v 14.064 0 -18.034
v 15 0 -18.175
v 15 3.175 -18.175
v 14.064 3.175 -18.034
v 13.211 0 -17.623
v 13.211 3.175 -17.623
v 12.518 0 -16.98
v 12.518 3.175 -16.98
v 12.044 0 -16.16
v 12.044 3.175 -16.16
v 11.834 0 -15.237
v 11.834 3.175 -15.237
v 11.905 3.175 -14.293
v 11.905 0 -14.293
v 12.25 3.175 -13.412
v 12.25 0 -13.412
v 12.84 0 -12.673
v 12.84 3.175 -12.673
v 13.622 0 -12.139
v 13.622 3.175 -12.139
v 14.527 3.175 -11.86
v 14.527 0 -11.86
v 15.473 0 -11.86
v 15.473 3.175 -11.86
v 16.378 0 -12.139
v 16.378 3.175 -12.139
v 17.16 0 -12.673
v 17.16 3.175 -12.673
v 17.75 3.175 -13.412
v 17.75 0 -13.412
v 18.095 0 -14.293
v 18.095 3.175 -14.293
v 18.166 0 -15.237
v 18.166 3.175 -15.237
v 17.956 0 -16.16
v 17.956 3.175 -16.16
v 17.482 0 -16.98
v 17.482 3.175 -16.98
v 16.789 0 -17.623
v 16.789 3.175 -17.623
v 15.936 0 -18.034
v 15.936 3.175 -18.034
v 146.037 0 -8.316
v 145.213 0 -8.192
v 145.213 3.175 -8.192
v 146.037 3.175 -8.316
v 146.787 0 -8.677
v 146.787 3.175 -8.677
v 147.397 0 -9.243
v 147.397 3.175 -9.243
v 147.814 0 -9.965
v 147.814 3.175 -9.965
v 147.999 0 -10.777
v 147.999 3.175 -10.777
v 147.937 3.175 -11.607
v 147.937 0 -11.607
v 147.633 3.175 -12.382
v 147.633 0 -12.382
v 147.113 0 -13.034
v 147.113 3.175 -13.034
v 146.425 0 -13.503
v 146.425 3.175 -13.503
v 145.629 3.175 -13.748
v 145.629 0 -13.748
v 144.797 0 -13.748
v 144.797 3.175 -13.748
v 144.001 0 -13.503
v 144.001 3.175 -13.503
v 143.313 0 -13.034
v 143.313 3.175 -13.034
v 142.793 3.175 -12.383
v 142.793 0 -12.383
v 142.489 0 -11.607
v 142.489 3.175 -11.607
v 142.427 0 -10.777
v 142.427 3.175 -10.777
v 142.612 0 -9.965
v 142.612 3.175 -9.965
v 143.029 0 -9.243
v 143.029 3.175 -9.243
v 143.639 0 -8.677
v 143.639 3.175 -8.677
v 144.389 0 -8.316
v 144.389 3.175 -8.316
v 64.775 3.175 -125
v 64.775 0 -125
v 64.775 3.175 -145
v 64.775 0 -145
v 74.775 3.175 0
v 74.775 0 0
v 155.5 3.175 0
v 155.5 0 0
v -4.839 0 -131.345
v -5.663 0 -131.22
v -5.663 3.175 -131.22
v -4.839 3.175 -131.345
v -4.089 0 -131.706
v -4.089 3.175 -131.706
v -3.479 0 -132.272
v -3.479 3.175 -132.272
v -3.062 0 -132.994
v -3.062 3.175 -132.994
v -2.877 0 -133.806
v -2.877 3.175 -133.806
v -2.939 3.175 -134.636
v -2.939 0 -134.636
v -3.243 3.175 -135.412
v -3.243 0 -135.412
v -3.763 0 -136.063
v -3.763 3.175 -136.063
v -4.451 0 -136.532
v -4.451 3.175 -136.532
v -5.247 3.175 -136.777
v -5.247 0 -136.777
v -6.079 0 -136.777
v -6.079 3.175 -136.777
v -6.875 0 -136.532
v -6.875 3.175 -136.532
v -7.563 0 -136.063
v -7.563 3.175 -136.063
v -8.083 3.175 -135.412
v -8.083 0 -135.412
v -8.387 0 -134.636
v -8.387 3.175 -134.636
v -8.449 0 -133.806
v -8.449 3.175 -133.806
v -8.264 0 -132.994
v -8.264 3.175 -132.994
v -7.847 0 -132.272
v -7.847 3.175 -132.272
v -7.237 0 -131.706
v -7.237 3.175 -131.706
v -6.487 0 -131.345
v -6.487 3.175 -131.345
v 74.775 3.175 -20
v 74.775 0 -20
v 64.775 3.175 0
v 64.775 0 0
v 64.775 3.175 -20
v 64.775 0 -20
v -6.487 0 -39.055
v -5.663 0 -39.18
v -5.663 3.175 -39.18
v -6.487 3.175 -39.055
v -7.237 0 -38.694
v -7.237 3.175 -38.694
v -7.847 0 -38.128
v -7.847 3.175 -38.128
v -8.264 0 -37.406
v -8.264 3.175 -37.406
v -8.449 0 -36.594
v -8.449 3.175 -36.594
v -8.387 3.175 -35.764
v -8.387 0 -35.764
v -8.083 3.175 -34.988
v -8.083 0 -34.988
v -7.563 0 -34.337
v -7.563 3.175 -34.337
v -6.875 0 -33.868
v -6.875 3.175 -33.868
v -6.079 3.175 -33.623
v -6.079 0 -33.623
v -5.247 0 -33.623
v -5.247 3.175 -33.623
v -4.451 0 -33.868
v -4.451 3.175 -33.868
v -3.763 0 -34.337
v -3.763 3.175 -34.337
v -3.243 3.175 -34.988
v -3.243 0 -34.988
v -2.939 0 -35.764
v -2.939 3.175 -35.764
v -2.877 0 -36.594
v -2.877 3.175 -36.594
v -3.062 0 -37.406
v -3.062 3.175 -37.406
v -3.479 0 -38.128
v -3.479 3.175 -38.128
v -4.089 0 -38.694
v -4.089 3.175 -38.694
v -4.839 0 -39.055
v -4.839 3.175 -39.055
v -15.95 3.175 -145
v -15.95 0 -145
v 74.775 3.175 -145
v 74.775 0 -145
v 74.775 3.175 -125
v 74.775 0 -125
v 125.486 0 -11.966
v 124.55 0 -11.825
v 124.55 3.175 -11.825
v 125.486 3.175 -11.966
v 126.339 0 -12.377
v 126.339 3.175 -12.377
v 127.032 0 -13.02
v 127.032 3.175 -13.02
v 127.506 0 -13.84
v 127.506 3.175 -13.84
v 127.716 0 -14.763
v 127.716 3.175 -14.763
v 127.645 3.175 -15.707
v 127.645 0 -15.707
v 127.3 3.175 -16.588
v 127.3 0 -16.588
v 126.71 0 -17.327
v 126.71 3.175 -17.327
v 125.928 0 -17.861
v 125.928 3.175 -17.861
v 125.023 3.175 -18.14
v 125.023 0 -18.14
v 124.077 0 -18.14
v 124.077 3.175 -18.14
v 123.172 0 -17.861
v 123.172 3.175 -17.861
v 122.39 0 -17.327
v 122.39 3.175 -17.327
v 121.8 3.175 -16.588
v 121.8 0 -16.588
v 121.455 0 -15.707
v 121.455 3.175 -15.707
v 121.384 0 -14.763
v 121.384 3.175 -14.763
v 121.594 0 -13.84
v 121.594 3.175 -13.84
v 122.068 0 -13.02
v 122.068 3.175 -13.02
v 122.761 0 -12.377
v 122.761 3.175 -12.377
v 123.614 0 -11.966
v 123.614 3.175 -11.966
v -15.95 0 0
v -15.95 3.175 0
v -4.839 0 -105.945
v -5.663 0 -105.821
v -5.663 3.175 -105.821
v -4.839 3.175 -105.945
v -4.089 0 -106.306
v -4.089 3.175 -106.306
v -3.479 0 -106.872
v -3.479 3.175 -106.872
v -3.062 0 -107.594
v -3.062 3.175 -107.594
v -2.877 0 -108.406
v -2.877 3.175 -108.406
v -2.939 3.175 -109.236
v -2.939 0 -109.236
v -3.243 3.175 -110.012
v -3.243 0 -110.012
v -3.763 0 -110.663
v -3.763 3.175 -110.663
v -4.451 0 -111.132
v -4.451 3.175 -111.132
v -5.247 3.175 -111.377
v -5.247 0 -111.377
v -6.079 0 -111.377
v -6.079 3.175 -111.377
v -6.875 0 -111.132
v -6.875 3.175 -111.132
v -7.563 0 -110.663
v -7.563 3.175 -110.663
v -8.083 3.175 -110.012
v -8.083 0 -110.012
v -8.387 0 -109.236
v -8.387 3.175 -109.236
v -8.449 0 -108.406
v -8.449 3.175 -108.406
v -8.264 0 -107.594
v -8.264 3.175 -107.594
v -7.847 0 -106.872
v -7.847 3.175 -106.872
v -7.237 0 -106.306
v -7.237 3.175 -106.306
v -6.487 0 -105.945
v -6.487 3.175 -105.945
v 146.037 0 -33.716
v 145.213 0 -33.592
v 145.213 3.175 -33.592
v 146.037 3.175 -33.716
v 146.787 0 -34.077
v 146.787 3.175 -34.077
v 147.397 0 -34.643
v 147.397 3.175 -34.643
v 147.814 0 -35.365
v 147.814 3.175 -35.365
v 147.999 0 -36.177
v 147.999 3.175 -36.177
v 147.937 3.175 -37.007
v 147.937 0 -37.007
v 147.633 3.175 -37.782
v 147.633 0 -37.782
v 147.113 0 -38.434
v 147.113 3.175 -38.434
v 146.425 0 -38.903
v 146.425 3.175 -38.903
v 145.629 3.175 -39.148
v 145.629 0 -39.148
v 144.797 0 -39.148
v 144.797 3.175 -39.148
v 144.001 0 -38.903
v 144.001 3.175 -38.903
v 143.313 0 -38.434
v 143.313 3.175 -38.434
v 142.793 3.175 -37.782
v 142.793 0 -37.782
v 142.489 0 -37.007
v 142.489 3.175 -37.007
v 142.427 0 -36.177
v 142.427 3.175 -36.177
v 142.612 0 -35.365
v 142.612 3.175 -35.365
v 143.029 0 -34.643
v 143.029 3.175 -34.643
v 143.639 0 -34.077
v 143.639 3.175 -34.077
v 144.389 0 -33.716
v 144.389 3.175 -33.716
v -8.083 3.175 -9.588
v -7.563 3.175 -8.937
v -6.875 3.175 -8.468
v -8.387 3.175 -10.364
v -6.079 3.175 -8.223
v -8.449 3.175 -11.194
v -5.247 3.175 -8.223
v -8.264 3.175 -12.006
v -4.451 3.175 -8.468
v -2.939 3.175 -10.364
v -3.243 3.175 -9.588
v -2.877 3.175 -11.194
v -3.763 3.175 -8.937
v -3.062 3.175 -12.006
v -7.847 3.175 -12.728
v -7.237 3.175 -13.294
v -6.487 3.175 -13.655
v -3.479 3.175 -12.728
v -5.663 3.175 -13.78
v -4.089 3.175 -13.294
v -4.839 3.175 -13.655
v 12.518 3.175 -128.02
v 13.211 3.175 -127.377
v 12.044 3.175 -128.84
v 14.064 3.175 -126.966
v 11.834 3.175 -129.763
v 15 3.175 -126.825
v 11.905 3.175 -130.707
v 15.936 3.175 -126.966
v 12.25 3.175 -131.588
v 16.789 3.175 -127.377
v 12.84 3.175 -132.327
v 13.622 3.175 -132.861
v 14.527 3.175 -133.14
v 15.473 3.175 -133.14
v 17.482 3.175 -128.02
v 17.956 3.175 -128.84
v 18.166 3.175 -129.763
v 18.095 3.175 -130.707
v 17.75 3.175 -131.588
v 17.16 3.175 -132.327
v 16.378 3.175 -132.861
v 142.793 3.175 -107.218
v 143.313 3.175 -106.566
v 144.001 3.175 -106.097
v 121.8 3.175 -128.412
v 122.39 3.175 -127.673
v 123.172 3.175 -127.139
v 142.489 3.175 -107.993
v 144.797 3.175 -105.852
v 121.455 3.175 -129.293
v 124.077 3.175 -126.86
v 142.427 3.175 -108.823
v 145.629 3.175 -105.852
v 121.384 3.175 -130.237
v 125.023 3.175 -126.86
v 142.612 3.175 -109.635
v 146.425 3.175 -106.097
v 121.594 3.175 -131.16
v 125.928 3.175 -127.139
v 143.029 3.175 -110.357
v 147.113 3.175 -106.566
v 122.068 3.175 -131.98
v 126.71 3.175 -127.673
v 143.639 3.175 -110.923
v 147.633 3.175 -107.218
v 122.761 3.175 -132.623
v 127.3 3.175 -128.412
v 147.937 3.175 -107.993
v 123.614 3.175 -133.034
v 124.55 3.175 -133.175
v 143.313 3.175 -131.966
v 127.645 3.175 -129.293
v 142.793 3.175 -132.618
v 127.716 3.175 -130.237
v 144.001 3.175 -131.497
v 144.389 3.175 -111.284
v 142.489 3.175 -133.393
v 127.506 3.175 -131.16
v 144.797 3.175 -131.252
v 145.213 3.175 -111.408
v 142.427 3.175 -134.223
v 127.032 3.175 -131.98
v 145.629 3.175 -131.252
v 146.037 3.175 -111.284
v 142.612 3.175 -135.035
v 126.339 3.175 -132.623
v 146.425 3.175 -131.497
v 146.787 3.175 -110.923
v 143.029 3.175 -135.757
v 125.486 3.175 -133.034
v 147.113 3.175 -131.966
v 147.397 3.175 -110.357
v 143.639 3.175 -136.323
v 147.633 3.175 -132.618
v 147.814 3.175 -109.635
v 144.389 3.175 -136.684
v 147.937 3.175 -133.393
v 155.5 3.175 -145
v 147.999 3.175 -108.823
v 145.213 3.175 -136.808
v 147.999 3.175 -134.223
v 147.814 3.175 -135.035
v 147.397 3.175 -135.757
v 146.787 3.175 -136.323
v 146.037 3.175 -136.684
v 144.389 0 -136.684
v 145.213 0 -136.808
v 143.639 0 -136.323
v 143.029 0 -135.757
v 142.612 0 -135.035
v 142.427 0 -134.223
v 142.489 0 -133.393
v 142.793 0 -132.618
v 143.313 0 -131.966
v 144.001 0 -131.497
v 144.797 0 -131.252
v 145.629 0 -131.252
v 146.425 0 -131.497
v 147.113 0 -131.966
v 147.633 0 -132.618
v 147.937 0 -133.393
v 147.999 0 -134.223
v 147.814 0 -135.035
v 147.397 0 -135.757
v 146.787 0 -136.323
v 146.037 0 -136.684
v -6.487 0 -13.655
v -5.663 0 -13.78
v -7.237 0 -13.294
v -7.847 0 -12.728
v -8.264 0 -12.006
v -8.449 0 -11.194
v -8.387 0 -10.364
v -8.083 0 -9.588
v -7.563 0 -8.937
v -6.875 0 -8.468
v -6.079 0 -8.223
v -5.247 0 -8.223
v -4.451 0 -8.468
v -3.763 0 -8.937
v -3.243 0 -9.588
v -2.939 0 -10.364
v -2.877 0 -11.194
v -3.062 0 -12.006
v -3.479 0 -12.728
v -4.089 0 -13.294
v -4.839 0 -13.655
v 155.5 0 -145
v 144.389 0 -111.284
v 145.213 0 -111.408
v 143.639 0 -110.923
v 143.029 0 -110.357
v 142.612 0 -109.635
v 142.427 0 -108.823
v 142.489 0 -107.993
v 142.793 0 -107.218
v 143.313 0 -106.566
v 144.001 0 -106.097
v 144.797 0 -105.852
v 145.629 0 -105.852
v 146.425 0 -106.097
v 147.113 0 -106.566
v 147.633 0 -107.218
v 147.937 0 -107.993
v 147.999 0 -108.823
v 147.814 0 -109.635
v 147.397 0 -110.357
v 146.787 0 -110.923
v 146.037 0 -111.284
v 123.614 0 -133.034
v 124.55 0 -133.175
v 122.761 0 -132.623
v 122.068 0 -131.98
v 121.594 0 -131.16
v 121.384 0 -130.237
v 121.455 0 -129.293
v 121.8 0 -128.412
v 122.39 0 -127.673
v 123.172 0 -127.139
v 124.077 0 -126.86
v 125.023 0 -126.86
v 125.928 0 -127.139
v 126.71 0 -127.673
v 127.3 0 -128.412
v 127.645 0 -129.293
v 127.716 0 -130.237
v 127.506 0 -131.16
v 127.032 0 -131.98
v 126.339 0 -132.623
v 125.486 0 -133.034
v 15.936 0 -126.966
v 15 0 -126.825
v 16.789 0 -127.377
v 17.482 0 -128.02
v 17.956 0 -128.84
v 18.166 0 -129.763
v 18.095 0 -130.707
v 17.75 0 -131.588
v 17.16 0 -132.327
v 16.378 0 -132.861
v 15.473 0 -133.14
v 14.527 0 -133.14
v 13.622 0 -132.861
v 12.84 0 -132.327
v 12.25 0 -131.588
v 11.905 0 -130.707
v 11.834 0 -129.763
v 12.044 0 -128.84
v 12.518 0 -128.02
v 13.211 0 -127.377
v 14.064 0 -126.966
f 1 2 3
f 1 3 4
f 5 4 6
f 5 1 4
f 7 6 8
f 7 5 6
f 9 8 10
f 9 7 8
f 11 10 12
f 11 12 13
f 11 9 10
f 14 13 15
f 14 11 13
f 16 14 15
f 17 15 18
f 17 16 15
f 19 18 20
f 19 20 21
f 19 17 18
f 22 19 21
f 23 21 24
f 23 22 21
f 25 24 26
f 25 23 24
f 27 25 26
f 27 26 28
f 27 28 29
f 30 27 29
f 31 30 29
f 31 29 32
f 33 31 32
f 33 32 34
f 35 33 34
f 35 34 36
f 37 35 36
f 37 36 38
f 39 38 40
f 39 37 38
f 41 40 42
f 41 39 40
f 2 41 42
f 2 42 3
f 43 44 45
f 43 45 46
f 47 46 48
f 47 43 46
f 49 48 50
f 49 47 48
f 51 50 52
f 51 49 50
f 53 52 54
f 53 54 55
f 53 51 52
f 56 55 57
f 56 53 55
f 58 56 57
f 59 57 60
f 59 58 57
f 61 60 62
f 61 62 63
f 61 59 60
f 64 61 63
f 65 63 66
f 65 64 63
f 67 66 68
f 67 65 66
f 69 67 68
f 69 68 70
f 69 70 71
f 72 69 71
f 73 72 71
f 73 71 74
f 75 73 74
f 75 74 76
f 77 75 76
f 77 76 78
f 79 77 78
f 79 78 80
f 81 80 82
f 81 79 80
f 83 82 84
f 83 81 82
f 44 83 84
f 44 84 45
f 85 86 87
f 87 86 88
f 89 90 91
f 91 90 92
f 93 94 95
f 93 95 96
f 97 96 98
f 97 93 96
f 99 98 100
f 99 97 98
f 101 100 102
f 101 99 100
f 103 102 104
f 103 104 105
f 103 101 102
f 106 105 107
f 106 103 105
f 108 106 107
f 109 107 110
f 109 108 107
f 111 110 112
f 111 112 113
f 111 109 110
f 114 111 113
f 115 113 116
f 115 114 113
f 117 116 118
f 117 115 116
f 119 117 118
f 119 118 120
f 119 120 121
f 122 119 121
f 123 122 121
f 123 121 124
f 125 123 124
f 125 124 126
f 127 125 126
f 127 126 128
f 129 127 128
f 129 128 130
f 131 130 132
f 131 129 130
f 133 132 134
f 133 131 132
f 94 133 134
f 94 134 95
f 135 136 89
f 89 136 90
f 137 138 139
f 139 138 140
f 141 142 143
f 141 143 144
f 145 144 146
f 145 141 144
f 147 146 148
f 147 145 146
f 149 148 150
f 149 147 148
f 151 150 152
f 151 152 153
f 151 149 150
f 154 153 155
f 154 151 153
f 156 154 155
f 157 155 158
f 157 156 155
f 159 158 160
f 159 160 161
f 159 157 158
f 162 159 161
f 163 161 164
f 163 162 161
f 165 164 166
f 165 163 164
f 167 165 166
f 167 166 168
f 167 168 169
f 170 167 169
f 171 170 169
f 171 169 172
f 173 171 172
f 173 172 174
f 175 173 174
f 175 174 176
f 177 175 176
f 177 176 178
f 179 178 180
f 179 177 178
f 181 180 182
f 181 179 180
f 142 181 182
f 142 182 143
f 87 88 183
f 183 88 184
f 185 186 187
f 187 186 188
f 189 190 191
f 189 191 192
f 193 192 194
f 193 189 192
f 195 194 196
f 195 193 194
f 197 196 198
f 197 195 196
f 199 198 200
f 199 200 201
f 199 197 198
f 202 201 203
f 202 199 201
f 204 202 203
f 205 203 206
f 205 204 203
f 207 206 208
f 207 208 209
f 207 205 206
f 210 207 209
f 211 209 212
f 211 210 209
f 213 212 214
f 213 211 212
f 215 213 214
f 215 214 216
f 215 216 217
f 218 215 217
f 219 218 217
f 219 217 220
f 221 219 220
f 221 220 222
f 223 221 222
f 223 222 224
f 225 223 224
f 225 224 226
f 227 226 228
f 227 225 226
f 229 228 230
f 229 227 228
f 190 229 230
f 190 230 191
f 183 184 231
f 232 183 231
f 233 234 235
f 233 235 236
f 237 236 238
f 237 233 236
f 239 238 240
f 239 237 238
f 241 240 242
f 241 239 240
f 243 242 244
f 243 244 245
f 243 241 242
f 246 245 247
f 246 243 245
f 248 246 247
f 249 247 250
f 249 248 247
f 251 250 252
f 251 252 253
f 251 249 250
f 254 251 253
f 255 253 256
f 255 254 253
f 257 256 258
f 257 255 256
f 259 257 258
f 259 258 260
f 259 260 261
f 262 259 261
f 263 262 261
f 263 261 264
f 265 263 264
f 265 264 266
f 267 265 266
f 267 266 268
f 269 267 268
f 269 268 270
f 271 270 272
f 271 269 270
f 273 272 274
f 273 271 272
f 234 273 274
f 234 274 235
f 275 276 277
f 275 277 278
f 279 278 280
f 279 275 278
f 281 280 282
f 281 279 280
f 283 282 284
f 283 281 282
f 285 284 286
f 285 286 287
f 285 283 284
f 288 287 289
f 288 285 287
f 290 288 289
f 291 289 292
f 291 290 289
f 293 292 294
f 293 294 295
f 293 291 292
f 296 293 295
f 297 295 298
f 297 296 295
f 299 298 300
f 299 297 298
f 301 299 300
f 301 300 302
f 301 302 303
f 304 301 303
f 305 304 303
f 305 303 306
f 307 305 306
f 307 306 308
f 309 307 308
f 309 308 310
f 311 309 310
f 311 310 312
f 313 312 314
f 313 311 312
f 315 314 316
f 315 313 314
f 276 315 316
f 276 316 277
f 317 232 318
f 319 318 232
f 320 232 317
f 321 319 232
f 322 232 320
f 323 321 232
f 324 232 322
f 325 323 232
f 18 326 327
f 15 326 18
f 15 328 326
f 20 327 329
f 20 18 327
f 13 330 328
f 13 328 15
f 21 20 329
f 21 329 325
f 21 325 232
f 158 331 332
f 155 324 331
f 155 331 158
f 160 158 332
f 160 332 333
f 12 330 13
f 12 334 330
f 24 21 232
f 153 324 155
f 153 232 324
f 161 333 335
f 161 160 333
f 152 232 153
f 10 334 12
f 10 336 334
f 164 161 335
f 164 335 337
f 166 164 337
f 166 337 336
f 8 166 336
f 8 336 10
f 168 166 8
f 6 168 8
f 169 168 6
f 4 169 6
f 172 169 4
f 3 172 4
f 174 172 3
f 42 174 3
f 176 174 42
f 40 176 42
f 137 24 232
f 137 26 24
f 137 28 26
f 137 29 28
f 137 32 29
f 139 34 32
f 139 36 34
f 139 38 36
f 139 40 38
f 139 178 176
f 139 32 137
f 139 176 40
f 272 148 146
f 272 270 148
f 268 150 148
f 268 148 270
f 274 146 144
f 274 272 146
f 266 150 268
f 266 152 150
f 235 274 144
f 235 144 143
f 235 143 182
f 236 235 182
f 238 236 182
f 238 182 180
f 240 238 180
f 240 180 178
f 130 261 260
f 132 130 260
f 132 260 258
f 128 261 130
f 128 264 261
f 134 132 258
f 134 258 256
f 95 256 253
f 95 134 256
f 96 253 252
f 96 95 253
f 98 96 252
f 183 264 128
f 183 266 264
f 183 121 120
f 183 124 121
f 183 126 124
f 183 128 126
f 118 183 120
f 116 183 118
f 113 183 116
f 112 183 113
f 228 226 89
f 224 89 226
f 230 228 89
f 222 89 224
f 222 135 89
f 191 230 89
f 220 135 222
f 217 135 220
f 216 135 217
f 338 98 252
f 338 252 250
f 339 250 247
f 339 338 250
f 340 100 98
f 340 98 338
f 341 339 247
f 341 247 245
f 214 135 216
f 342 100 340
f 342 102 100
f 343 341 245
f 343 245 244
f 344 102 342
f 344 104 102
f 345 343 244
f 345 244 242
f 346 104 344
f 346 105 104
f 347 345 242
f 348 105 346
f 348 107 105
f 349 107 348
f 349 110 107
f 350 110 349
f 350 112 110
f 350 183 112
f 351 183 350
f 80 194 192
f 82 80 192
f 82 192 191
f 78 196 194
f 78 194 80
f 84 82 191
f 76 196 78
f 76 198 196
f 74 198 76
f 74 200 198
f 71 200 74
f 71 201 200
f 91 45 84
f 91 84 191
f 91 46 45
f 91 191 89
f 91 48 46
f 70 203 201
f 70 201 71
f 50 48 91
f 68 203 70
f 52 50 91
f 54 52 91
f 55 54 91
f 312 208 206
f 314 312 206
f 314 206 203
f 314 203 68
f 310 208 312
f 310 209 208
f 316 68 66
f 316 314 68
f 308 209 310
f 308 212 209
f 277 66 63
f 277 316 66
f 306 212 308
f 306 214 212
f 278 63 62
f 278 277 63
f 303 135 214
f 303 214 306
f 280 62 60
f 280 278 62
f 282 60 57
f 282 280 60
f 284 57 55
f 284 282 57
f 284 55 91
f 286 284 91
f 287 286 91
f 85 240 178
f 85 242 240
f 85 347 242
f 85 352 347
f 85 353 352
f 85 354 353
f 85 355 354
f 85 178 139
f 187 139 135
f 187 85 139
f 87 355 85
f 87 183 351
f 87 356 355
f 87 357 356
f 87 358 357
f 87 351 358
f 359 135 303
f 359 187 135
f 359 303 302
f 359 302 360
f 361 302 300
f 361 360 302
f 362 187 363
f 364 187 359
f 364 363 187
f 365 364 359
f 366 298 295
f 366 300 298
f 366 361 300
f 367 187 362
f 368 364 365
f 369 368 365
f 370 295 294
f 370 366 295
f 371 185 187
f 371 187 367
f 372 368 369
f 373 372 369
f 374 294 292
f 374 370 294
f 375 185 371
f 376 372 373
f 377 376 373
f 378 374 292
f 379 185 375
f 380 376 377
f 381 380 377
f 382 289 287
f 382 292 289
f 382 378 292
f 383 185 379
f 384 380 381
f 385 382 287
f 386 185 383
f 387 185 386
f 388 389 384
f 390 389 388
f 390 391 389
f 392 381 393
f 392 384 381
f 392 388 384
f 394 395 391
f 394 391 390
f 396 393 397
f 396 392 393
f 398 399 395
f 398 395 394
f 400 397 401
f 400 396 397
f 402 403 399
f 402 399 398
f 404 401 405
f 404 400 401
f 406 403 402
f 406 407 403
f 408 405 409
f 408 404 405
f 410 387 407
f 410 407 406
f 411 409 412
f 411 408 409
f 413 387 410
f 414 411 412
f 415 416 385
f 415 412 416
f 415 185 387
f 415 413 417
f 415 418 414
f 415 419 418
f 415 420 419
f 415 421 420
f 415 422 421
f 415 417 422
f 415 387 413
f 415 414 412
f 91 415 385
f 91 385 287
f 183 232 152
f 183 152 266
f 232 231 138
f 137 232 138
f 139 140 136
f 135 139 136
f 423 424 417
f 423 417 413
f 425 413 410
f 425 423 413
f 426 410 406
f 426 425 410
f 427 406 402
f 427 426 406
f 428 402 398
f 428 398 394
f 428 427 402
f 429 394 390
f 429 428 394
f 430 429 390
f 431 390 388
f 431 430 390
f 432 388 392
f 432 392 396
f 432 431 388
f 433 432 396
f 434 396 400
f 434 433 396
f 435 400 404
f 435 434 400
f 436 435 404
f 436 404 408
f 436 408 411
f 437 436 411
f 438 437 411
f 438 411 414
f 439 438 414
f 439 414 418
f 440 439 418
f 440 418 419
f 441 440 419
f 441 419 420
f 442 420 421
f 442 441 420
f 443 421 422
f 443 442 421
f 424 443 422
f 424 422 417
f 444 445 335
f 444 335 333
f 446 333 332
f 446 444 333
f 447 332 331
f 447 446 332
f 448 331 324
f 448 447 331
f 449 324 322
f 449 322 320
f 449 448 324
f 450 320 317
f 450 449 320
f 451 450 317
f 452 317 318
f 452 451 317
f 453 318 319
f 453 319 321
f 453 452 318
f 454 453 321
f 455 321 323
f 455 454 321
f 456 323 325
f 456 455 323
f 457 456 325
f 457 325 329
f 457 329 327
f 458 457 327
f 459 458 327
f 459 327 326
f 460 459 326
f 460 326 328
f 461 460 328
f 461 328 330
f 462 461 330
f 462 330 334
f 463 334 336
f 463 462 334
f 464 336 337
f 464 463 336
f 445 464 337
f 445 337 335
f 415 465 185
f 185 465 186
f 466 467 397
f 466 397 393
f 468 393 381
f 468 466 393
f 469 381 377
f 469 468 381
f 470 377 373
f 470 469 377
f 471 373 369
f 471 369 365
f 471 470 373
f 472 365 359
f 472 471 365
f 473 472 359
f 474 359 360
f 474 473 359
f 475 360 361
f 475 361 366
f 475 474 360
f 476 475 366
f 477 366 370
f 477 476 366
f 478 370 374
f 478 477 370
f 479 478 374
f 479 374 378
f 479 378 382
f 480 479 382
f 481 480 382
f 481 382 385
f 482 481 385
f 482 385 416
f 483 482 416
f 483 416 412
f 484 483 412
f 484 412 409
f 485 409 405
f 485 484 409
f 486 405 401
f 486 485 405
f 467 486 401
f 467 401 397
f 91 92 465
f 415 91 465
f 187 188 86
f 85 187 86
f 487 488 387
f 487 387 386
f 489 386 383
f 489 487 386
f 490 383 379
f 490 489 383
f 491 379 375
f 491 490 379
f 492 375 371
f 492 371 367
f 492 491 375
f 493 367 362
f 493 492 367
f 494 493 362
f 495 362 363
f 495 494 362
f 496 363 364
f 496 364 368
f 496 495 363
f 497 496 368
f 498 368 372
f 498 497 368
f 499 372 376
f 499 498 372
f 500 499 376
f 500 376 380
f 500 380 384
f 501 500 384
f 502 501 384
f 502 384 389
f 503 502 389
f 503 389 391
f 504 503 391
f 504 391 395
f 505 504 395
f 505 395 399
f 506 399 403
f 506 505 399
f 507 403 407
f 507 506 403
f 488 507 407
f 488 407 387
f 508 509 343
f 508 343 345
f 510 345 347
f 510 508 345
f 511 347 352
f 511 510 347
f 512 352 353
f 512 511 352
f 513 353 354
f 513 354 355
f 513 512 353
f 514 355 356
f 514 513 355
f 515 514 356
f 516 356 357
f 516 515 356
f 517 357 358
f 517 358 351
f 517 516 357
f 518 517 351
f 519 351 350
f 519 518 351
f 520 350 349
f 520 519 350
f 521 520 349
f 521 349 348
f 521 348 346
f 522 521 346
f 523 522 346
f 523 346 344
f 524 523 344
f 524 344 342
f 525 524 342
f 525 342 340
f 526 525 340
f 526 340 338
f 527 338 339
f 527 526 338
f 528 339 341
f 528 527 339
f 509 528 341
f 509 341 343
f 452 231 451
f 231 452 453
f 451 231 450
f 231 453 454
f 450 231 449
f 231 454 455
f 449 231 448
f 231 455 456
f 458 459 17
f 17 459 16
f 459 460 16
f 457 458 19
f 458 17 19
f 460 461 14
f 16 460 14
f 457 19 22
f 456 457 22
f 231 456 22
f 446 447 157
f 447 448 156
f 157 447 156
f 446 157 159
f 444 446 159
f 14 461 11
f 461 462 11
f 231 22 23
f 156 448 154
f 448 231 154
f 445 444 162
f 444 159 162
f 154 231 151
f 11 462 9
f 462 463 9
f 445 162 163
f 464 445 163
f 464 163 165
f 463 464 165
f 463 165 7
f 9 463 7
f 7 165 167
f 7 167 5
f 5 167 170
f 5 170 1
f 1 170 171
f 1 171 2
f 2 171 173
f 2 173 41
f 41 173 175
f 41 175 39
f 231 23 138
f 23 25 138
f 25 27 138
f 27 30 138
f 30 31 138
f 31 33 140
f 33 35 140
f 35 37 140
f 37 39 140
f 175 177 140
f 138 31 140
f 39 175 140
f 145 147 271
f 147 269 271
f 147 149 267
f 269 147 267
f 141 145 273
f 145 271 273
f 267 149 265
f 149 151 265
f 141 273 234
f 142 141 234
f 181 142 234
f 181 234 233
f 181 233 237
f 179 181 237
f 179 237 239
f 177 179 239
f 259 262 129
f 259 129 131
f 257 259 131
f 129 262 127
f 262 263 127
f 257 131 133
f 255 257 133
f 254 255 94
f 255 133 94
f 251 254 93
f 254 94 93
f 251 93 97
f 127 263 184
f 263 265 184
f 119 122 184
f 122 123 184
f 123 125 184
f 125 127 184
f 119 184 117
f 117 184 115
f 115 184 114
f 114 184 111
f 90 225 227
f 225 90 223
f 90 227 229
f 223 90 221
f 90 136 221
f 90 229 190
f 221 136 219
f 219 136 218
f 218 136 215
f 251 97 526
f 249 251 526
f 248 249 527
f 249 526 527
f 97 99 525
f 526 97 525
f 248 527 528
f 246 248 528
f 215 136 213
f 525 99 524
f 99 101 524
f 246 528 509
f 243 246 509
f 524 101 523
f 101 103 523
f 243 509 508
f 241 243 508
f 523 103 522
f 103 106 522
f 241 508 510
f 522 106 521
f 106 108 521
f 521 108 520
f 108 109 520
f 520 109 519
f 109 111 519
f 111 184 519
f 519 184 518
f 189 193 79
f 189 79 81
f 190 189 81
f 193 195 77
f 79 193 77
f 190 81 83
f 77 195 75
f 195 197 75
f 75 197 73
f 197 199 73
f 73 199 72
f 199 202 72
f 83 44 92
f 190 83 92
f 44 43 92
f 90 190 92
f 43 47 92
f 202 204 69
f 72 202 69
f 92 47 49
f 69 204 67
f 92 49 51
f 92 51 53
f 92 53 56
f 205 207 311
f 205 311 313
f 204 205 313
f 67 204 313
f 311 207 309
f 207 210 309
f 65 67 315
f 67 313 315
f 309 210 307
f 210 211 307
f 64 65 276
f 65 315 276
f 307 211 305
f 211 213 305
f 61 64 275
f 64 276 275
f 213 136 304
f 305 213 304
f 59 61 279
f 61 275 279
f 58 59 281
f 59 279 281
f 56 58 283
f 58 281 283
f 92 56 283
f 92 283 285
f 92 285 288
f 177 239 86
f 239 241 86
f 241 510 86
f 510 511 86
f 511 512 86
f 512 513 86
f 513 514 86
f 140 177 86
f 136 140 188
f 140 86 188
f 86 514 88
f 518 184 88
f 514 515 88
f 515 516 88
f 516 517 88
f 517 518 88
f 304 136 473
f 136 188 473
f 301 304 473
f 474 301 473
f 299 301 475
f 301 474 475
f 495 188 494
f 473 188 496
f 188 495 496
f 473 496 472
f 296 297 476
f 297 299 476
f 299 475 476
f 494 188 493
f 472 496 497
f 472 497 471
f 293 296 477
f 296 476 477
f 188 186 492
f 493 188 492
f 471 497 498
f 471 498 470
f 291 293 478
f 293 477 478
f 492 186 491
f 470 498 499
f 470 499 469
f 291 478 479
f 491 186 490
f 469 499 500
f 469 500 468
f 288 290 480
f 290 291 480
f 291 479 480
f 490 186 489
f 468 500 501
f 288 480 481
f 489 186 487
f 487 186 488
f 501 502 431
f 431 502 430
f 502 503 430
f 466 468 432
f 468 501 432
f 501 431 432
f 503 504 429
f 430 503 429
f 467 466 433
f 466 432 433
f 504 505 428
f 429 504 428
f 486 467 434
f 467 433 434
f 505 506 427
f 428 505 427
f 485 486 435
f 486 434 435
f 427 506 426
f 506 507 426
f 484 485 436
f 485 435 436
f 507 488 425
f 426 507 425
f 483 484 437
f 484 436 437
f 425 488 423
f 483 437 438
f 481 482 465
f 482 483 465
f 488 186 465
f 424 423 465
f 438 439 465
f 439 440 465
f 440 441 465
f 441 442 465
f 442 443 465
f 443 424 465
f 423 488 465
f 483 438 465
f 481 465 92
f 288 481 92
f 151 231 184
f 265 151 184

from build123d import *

# Parameters (mm, degrees)
SKETCH1_R           = 3.175
SKETCH1_R_2         = 2.794
BOSS_EXTRUDE3_DEPTH = 3.175


with BuildPart() as part:
    # Sketch1 → Boss-Extrude3 (new body)
    with BuildSketch(Plane(origin=(0, 0, 0), x_dir=(1, 0, 0), z_dir=(0, 1, 0))):
        Polygon((0, 0), (64.775, 0), (64.775, 20), (74.775, 20), (74.775, 0), (155.5, 0), (155.5, 145), (139.55, 145), (74.775, 145), (74.775, 125), (64.775, 125), (64.775, 130), (64.775, 145), (0, 145), (-15.95, 145), (-15.95, 0), align=None)
        with Locations(Location((15, 130, 0), (0, 0, 270))):
            Circle(SKETCH1_R, mode=Mode.SUBTRACT)
        with Locations(Location((124.55, 130, 0), (0, 0, 90))):
            Circle(SKETCH1_R, mode=Mode.SUBTRACT)
        with Locations(Location((15, 15, 0), (0, 0, 90))):
            Circle(SKETCH1_R, mode=Mode.SUBTRACT)
        with Locations(Location((124.55, 15, 0), (0, 0, 270))):
            Circle(SKETCH1_R, mode=Mode.SUBTRACT)
        with Locations(Location((-5.663, 134.0145, 0), (0, 0, 270))):
            Circle(SKETCH1_R_2, mode=Mode.SUBTRACT)
        with Locations(Location((-5.663, 108.6145, 0), (0, 0, 270))):
            Circle(SKETCH1_R_2, mode=Mode.SUBTRACT)
        with Locations(Location((145.213, 134.0145, 0), (0, 0, 90))):
            Circle(SKETCH1_R_2, mode=Mode.SUBTRACT)
        with Locations(Location((145.213, 108.6145, 0), (0, 0, 90))):
            Circle(SKETCH1_R_2, mode=Mode.SUBTRACT)
        with Locations(Location((-5.663, 36.3855, 0), (0, 0, 90))):
            Circle(SKETCH1_R_2, mode=Mode.SUBTRACT)
        with Locations(Location((-5.663, 10.9855, 0), (0, 0, 90))):
            Circle(SKETCH1_R_2, mode=Mode.SUBTRACT)
        with Locations(Location((145.213, 10.9855, 0), (0, 0, 270))):
            Circle(SKETCH1_R_2, mode=Mode.SUBTRACT)
        with Locations(Location((145.213, 36.3855, 0), (0, 0, 270))):
            Circle(SKETCH1_R_2, mode=Mode.SUBTRACT)
    extrude(amount=BOSS_EXTRUDE3_DEPTH)


solid = part.part
